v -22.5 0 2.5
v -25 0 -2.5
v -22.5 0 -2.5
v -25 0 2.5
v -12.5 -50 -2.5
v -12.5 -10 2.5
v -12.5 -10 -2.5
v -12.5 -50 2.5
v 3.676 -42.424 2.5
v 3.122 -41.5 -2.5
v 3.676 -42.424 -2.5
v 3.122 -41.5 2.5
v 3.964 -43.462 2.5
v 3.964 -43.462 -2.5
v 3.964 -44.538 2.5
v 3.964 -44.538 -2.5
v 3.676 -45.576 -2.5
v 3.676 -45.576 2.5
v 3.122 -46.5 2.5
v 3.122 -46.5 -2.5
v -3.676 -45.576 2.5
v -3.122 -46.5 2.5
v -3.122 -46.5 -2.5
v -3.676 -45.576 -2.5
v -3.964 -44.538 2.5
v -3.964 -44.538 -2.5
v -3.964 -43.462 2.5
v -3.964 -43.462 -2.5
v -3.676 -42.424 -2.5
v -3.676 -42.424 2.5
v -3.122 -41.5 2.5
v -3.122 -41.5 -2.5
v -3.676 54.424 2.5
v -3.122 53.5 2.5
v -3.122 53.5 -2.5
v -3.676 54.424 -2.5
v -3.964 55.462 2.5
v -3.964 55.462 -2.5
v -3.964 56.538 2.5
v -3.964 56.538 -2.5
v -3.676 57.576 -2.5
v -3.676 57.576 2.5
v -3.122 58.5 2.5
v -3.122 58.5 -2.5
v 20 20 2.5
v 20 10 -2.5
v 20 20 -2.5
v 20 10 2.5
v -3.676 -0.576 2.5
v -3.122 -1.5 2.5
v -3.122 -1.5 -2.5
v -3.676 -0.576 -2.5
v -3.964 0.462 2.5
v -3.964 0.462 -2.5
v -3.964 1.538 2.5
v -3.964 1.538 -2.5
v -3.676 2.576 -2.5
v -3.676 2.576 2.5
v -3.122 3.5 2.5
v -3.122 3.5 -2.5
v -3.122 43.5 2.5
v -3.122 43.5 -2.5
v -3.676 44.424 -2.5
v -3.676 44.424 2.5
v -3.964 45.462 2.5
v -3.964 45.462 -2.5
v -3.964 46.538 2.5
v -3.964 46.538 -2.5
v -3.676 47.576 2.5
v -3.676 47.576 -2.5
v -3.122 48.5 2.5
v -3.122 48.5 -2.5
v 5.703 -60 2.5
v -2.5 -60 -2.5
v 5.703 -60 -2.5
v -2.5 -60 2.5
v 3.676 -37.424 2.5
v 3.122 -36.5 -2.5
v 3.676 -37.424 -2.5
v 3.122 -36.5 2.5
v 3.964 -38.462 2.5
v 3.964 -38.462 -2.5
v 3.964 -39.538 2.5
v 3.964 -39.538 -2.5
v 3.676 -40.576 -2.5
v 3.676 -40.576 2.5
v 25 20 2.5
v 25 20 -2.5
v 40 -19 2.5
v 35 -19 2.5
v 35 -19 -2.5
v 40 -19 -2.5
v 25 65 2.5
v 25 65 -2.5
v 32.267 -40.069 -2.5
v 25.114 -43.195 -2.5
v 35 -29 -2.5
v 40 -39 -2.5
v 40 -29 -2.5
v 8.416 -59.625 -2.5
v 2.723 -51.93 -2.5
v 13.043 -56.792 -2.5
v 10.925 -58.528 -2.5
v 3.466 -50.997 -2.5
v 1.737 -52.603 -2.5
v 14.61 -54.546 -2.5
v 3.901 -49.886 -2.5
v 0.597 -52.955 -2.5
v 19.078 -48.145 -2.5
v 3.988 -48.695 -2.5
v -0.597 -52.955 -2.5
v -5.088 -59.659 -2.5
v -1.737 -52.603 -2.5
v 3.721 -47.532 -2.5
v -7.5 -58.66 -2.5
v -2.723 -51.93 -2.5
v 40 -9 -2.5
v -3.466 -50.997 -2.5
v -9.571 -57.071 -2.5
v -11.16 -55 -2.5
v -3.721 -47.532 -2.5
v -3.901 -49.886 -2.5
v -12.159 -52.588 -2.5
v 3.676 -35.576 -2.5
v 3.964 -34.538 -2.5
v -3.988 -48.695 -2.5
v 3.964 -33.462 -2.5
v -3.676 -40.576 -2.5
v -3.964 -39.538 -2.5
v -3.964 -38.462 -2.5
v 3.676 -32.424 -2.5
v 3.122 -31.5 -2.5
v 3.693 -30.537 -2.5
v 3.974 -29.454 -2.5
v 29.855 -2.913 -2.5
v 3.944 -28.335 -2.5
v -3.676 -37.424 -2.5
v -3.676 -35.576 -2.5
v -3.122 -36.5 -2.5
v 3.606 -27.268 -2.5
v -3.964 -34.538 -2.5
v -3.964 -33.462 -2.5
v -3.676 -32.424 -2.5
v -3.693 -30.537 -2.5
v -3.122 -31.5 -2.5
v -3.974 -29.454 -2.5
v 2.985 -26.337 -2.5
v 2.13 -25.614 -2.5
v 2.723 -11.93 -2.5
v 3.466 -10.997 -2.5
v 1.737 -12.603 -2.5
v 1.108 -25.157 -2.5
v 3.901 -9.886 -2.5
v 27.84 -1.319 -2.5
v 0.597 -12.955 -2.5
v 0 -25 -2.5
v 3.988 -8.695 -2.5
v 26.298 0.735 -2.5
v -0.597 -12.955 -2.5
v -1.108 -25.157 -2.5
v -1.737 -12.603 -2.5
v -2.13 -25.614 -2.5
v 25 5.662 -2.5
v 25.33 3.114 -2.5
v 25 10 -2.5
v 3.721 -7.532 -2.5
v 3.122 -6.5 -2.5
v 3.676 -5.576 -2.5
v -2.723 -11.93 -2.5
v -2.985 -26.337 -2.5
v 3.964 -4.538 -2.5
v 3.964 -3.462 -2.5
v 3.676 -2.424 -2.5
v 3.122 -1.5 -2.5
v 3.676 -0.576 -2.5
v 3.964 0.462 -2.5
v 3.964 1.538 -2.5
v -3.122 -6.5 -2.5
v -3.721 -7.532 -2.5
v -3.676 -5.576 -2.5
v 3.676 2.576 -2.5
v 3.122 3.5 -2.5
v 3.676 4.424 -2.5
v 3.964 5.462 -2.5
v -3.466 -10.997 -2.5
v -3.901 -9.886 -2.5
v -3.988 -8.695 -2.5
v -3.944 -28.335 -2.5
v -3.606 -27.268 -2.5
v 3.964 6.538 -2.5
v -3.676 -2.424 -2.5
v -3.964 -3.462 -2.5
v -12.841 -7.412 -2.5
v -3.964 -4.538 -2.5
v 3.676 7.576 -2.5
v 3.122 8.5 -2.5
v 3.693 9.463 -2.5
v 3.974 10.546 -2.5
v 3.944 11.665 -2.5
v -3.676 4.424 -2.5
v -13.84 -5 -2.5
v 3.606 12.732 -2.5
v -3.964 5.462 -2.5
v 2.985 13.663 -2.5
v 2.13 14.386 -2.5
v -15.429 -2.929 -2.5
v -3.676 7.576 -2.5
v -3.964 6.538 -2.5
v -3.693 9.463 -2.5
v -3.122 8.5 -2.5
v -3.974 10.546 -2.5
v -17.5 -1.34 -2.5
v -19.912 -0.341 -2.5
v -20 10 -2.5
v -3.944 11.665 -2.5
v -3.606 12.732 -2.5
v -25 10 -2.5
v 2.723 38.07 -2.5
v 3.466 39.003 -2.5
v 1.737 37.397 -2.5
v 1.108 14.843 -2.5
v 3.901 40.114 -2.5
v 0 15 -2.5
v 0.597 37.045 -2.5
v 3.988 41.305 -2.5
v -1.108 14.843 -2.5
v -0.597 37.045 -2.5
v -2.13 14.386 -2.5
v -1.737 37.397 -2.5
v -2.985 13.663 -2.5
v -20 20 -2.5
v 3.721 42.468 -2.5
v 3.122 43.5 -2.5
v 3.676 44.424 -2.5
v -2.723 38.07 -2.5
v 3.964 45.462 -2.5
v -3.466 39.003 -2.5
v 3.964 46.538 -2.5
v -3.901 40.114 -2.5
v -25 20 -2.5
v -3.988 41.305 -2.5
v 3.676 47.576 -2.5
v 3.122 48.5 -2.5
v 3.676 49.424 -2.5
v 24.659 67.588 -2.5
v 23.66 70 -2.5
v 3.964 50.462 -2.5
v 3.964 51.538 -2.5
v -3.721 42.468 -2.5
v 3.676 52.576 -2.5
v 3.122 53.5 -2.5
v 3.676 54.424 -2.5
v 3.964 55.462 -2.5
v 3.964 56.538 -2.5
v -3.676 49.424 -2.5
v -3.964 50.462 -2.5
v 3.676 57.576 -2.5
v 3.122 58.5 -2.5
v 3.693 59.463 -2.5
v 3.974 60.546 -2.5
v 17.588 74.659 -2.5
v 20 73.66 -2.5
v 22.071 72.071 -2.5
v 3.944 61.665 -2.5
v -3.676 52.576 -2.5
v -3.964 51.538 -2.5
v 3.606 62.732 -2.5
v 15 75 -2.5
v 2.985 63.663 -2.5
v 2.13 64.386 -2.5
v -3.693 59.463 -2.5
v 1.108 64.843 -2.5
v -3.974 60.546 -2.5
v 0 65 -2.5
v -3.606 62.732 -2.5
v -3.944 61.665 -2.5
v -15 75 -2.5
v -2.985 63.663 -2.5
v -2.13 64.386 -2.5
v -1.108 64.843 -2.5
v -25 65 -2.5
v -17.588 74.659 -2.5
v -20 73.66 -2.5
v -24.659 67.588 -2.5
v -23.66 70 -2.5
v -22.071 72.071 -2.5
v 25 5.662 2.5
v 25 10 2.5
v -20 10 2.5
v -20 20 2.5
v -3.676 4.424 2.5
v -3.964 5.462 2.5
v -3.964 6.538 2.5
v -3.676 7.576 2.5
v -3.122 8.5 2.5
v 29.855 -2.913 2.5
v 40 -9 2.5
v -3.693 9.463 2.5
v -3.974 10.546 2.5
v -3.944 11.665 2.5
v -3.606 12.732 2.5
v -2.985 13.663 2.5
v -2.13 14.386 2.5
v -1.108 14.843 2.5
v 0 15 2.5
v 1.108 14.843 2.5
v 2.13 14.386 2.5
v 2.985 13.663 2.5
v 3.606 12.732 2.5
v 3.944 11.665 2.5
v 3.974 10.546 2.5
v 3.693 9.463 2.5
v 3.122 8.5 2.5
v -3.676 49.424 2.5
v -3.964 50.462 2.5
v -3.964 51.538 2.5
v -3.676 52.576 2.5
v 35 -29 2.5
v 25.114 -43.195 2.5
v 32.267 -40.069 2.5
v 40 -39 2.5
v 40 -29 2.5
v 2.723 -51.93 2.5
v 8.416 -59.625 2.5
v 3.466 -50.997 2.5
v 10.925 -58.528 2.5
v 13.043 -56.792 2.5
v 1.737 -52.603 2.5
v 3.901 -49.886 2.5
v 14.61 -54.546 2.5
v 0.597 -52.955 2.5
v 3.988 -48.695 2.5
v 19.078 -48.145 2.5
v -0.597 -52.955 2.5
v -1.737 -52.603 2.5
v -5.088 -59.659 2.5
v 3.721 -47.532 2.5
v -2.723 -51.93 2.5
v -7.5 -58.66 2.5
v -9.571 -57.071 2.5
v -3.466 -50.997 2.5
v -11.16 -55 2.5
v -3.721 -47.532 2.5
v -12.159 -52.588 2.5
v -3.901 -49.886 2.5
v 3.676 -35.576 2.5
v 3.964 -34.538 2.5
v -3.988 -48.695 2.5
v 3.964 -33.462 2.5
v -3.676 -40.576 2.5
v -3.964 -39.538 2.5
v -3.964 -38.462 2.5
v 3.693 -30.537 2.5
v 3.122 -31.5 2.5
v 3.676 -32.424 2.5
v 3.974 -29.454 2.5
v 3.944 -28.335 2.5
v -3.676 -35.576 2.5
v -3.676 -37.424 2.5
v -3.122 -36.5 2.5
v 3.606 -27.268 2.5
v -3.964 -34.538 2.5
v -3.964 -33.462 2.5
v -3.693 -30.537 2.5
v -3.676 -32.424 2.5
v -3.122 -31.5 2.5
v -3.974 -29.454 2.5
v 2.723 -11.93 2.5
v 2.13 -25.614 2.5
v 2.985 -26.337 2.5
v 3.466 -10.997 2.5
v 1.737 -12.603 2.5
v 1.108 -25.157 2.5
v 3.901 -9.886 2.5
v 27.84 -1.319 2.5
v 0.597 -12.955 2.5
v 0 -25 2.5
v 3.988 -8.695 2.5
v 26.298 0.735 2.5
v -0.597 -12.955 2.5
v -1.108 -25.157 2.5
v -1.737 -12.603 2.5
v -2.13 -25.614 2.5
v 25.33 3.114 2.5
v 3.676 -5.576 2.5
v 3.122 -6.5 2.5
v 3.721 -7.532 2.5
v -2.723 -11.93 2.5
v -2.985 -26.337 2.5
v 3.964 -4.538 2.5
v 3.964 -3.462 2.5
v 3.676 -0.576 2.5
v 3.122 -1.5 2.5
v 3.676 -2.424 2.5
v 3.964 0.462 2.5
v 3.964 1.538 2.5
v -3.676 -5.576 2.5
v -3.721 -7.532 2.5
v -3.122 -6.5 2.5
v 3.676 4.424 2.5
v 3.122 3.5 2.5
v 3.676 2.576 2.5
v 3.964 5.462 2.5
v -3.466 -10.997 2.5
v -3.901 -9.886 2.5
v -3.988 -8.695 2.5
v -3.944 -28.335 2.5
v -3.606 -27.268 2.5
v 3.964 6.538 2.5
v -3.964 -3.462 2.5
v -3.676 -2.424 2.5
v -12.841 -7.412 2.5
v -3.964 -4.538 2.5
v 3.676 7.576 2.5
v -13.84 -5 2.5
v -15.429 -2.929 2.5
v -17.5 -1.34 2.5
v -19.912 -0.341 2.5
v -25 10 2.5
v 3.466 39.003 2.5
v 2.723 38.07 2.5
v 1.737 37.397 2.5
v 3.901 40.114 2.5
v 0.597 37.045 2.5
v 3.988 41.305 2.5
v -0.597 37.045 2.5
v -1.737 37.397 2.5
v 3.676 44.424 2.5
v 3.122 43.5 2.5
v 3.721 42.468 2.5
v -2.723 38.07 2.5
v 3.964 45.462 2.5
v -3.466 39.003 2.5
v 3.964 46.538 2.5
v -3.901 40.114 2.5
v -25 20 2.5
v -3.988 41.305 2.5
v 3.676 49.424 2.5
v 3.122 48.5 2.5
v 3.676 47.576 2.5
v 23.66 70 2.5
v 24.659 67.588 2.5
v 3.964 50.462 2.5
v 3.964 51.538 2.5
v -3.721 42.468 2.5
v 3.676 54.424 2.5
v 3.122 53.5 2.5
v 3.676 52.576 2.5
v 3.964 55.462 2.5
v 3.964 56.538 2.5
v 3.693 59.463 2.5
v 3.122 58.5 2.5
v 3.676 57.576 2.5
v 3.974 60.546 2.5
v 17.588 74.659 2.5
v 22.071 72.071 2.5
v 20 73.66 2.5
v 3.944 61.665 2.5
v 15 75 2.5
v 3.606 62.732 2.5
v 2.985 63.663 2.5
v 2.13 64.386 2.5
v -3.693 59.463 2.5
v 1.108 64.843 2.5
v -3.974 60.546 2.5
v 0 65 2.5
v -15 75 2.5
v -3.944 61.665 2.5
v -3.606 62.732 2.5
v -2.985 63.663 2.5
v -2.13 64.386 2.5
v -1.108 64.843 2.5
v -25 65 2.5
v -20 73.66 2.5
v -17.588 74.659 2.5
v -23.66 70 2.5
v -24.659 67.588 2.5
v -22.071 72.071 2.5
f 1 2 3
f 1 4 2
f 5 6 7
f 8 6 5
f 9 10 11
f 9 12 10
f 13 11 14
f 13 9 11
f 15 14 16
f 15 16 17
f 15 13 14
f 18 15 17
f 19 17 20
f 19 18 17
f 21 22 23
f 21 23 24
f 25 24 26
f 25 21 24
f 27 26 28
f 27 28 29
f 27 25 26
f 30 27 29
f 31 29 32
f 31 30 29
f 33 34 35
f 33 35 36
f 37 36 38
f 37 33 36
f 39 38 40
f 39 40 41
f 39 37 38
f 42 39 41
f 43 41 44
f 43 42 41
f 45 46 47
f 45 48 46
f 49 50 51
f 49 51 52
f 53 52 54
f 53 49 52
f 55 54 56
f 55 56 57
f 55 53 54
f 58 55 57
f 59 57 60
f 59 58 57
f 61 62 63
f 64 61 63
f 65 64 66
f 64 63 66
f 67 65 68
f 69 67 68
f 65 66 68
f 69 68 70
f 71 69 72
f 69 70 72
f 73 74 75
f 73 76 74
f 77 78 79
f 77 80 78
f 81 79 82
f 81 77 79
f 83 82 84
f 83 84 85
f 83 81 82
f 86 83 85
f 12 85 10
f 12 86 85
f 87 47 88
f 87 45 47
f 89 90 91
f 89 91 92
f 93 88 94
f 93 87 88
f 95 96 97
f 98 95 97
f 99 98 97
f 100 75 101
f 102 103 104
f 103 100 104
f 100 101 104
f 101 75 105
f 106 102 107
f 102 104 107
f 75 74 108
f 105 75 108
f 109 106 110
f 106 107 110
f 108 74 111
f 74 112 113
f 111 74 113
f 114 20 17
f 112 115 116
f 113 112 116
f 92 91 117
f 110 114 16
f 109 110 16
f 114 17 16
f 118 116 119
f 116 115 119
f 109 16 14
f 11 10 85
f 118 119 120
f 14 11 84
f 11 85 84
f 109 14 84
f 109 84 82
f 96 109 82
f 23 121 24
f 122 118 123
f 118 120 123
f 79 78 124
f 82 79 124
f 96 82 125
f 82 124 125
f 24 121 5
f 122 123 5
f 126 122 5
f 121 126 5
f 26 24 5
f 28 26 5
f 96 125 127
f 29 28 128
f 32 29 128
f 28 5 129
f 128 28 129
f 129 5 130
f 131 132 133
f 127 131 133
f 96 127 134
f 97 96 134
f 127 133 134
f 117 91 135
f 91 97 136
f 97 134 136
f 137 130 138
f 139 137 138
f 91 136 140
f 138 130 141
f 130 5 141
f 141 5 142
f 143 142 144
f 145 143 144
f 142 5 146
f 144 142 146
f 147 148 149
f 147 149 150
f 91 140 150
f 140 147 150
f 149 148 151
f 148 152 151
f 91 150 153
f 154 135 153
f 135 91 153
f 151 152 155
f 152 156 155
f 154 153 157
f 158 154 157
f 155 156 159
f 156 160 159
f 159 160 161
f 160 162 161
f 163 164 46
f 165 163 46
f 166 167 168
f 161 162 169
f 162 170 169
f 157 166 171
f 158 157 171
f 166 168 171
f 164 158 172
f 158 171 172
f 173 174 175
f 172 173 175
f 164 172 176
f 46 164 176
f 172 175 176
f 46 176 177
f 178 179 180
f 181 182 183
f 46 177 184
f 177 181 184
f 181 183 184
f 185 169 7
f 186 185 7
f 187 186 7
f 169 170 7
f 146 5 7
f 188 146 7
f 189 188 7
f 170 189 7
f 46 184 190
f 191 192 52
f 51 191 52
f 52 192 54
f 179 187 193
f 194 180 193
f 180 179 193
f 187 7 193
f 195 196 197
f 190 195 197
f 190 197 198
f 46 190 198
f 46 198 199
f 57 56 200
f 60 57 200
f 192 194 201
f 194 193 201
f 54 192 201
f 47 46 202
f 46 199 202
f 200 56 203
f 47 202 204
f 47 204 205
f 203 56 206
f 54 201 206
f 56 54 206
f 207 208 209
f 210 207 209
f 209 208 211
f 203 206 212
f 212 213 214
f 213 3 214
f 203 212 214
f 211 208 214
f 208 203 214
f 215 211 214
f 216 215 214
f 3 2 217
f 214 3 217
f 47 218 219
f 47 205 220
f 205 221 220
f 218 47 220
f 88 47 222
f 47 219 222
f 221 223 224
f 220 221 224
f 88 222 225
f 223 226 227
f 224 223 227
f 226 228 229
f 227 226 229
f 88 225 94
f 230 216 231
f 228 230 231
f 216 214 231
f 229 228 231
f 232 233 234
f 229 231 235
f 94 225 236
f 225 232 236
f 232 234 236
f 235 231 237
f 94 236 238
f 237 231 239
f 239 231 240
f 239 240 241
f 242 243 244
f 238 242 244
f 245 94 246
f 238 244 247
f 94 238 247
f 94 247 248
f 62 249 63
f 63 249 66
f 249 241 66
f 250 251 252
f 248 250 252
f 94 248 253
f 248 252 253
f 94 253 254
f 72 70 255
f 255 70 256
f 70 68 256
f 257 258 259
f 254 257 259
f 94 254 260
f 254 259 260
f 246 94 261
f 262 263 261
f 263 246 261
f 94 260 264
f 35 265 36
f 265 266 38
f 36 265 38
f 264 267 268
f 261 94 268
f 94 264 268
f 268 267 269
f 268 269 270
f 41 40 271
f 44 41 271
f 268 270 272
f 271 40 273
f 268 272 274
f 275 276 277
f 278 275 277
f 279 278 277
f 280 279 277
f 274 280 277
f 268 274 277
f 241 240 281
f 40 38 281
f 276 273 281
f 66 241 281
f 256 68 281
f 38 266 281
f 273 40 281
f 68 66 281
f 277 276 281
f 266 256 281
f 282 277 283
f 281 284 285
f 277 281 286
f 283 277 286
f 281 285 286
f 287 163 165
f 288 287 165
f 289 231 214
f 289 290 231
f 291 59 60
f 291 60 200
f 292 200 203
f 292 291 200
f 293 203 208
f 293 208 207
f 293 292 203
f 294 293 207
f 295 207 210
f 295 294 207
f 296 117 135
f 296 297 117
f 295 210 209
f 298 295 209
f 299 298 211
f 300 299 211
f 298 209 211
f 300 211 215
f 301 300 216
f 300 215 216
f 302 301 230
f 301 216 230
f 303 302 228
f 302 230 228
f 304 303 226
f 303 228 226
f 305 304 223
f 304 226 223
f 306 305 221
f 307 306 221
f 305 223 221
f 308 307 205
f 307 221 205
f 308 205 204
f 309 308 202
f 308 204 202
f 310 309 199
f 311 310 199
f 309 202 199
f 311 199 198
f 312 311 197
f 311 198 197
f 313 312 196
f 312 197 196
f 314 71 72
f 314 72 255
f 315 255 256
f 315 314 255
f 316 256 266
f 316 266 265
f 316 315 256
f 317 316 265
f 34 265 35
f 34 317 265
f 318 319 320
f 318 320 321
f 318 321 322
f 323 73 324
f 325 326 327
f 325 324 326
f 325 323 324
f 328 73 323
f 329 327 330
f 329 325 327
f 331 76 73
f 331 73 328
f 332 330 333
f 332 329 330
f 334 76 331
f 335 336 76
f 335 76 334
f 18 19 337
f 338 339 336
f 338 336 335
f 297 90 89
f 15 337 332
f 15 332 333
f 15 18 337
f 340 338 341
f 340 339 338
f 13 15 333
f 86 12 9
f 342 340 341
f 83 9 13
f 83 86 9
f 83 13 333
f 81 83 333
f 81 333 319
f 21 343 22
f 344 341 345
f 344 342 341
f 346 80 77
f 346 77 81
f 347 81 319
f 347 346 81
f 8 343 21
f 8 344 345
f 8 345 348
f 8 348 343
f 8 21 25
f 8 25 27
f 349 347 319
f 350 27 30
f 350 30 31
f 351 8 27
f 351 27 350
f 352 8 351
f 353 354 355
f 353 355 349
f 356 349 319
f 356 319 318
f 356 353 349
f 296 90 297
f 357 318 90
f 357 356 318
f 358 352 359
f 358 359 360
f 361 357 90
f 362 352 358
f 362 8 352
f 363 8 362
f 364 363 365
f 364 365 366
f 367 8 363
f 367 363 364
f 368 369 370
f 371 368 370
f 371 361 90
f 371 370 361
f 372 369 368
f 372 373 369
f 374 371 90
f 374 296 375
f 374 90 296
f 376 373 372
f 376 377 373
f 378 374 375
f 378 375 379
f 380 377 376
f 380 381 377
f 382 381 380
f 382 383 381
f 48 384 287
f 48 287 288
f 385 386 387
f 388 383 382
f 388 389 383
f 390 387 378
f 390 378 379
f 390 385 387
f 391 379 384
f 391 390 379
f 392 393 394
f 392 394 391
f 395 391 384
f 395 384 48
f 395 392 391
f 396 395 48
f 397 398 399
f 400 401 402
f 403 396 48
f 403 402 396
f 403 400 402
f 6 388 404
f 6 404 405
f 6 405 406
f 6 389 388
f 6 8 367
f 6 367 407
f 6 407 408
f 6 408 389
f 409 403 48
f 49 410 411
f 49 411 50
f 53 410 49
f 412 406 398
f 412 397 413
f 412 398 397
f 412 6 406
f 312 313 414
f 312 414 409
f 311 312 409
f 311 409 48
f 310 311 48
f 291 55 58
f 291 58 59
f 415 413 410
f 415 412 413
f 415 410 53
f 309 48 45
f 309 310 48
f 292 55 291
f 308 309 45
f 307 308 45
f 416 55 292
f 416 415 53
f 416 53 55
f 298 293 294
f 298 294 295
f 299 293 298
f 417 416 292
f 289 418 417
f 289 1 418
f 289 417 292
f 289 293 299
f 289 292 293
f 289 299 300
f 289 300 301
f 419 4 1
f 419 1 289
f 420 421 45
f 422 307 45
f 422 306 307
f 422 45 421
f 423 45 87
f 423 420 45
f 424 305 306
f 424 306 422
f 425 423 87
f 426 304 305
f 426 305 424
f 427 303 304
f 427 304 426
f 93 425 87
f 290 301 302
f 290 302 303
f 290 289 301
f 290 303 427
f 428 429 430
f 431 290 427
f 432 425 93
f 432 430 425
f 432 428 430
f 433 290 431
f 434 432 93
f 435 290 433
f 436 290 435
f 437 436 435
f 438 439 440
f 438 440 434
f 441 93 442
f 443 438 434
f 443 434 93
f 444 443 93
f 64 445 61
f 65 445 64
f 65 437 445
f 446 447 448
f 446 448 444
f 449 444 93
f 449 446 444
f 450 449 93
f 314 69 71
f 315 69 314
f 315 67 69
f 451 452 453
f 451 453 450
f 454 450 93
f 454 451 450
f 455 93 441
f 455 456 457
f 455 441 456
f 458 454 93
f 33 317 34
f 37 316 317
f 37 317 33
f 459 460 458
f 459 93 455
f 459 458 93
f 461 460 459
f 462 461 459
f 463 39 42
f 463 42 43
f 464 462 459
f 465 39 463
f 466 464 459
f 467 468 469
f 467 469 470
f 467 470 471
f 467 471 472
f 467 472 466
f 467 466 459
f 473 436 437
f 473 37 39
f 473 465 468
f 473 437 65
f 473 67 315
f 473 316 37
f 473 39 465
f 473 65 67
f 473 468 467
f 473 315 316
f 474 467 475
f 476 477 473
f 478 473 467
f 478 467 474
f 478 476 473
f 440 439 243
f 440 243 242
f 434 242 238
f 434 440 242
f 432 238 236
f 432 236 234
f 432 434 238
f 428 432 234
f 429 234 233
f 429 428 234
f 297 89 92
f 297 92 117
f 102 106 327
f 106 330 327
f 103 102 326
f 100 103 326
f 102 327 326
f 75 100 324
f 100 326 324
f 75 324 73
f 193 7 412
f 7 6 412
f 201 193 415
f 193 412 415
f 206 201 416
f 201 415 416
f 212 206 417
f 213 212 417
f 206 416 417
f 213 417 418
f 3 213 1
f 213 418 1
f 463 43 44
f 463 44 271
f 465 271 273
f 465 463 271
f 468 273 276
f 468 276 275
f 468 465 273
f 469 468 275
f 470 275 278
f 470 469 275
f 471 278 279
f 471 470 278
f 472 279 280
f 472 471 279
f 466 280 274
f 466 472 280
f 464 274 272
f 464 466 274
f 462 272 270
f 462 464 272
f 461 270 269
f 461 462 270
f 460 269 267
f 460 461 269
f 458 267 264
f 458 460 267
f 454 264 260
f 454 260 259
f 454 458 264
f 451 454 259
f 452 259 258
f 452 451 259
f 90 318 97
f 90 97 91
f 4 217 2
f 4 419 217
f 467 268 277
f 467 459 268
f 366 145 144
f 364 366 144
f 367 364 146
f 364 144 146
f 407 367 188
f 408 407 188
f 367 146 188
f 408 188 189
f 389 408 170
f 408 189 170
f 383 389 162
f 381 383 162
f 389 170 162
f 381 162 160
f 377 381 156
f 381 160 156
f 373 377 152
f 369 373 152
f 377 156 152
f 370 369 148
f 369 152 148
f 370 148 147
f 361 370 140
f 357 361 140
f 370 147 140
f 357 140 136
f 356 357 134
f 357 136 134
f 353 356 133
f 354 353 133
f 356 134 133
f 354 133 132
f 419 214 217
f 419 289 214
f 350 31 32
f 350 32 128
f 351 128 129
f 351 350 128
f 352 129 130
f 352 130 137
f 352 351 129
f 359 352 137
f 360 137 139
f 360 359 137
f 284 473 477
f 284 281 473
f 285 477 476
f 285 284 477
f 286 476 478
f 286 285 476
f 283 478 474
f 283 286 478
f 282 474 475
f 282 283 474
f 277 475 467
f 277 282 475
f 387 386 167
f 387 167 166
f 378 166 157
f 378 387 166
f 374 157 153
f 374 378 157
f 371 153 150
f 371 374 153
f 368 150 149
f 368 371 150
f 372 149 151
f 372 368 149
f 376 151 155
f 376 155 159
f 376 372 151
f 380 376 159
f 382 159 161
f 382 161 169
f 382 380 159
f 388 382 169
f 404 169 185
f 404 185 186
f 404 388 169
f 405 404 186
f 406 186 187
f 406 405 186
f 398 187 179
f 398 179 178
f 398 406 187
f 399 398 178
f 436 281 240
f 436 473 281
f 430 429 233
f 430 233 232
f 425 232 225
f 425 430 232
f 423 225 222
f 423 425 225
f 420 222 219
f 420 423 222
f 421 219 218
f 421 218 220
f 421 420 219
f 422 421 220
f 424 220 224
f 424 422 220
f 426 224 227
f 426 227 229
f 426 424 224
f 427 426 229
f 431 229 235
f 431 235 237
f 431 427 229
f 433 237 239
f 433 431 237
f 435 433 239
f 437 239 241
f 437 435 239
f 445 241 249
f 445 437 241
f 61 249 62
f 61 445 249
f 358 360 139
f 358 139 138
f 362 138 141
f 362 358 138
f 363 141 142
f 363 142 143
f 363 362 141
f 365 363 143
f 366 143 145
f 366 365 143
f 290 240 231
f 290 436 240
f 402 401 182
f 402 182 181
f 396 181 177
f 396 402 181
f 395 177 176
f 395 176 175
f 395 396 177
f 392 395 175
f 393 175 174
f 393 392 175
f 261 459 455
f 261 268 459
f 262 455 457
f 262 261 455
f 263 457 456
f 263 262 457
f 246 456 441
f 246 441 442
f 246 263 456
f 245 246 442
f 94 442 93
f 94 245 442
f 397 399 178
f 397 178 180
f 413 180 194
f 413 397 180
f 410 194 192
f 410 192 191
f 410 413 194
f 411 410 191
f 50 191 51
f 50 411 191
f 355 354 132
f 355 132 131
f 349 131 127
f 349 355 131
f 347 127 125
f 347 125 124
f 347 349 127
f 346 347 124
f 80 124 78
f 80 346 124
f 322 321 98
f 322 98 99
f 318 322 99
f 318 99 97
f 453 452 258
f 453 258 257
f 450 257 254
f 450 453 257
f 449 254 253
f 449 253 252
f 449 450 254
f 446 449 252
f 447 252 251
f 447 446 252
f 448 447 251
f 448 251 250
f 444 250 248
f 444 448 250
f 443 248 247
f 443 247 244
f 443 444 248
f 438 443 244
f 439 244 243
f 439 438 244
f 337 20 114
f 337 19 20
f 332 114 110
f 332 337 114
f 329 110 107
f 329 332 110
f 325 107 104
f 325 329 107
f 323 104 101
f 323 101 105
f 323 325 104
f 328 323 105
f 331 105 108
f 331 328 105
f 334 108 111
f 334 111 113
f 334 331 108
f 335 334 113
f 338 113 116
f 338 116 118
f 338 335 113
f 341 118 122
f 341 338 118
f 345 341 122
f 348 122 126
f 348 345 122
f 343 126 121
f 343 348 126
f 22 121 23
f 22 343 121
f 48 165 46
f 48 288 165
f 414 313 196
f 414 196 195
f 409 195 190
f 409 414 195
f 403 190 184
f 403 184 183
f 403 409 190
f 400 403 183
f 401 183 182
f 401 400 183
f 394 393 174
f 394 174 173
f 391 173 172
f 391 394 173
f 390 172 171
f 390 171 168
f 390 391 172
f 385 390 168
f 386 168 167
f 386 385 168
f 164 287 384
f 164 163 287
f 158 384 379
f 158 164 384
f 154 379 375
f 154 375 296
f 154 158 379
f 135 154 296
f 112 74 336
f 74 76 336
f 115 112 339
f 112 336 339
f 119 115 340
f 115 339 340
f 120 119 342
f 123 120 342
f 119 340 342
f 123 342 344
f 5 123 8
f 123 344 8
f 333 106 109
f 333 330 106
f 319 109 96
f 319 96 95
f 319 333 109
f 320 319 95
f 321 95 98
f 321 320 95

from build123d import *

# Parameters (mm, degrees)
BOSS_EXTRUDE1_DEPTH = 2.5
FILLET1_R           = 10


with BuildPart() as part:
    # Sketch1 → Boss-Extrude1 (new, symmetric)
    with BuildSketch(Plane(origin=(0, 0, 0), x_dir=(0, 1, 0), z_dir=(0, 0, 1))):
        with BuildLine():
            Line((10, 25), (0, 25))
            Line((0, 25), (0, 12.5))
            Line((0, 12.5), (-60, 12.5))
            Line((-60, 12.5), (-60, -12.5))
            ThreePointArc((-60, -12.5), (-44.850338923, -22.699349723), (-39, -40))
            Line((-39, -40), (-29, -40))
            Line((-29, -40), (-29, -35))
            Line((-29, -35), (-19, -35))
            Line((-19, -35), (-19, -40))
            Line((-19, -40), (-9, -40))
            Line((-9, -40), (0, -25))
            Line((0, -25), (10, -25))
            Line((10, -25), (10, -20))
            Line((10, -20), (20, -20))
            Line((20, -20), (20, -25))
            Line((20, -25), (75, -25))
            Line((75, -25), (75, 25))
            Line((75, 25), (20, 25))
            Line((20, 25), (20, 20))
            Line((20, 20), (10, 20))
            Line((10, 20), (10, 25))
        make_face()
        with BuildLine():
            ThreePointArc((-46.5, 3.122498999), (-44, 4), (-41.5, 3.122498999))
            ThreePointArc((-41.5, 3.122498999), (-39, 4), (-36.5, 3.122498999))
            ThreePointArc((-36.5, 3.122498999), (-34, 4), (-31.5, 3.122498999))
            ThreePointArc((-31.5, 3.122498999), (-27.267949192, 3.605551275), (-25, 0))
            ThreePointArc((-25, 0), (-27.267949192, -3.605551275), (-31.5, -3.122498999))
            ThreePointArc((-31.5, -3.122498999), (-34, -4), (-36.5, -3.122498999))
            ThreePointArc((-36.5, -3.122498999), (-39, -4), (-41.5, -3.122498999))
            ThreePointArc((-41.5, -3.122498999), (-44, -4), (-46.5, -3.122498999))
            ThreePointArc((-46.5, -3.122498999), (-53, 0), (-46.5, 3.122498999))
        make_face(mode=Mode.SUBTRACT)
        with BuildLine():
            ThreePointArc((-6.5, 3.122498999), (-4, 4), (-1.5, 3.122498999))
            ThreePointArc((-1.5, 3.122498999), (1, 4), (3.5, 3.122498999))
            ThreePointArc((3.5, 3.122498999), (6, 4), (8.5, 3.122498999))
            ThreePointArc((8.5, 3.122498999), (12.732050808, 3.605551275), (15, 0))
            ThreePointArc((15, 0), (12.732050808, -3.605551275), (8.5, -3.122498999))
            ThreePointArc((8.5, -3.122498999), (6, -4), (3.5, -3.122498999))
            ThreePointArc((3.5, -3.122498999), (1, -4), (-1.5, -3.122498999))
            ThreePointArc((-1.5, -3.122498999), (-4, -4), (-6.5, -3.122498999))
            ThreePointArc((-6.5, -3.122498999), (-13, 0), (-6.5, 3.122498999))
        make_face(mode=Mode.SUBTRACT)
        with BuildLine():
            ThreePointArc((43.5, 3.122498999), (46, 4), (48.5, 3.122498999))
            ThreePointArc((48.5, 3.122498999), (51, 4), (53.5, 3.122498999))
            ThreePointArc((53.5, 3.122498999), (56, 4), (58.5, 3.122498999))
            ThreePointArc((58.5, 3.122498999), (62.732050808, 3.605551275), (65, 0))
            ThreePointArc((65, 0), (62.732050808, -3.605551275), (58.5, -3.122498999))
            ThreePointArc((58.5, -3.122498999), (56, -4), (53.5, -3.122498999))
            ThreePointArc((53.5, -3.122498999), (51, -4), (48.5, -3.122498999))
            ThreePointArc((48.5, -3.122498999), (46, -4), (43.5, -3.122498999))
            ThreePointArc((43.5, -3.122498999), (37, 0), (43.5, 3.122498999))
        make_face(mode=Mode.SUBTRACT)
    extrude(amount=BOSS_EXTRUDE1_DEPTH, both=True)

    # Fillet1
    fillet1_edges = [part.edges().sort_by_distance(p)[0] for p in [
        (-12.5, -60, 0),
        (-12.5, 0, 0),
        (-25, 75, 0),
        (25, 75, 0),
        (25, 0, 0),
        (12.5, -60, 0),
    ]]
    fillet(fillet1_edges, radius=FILLET1_R)


solid = part.part
